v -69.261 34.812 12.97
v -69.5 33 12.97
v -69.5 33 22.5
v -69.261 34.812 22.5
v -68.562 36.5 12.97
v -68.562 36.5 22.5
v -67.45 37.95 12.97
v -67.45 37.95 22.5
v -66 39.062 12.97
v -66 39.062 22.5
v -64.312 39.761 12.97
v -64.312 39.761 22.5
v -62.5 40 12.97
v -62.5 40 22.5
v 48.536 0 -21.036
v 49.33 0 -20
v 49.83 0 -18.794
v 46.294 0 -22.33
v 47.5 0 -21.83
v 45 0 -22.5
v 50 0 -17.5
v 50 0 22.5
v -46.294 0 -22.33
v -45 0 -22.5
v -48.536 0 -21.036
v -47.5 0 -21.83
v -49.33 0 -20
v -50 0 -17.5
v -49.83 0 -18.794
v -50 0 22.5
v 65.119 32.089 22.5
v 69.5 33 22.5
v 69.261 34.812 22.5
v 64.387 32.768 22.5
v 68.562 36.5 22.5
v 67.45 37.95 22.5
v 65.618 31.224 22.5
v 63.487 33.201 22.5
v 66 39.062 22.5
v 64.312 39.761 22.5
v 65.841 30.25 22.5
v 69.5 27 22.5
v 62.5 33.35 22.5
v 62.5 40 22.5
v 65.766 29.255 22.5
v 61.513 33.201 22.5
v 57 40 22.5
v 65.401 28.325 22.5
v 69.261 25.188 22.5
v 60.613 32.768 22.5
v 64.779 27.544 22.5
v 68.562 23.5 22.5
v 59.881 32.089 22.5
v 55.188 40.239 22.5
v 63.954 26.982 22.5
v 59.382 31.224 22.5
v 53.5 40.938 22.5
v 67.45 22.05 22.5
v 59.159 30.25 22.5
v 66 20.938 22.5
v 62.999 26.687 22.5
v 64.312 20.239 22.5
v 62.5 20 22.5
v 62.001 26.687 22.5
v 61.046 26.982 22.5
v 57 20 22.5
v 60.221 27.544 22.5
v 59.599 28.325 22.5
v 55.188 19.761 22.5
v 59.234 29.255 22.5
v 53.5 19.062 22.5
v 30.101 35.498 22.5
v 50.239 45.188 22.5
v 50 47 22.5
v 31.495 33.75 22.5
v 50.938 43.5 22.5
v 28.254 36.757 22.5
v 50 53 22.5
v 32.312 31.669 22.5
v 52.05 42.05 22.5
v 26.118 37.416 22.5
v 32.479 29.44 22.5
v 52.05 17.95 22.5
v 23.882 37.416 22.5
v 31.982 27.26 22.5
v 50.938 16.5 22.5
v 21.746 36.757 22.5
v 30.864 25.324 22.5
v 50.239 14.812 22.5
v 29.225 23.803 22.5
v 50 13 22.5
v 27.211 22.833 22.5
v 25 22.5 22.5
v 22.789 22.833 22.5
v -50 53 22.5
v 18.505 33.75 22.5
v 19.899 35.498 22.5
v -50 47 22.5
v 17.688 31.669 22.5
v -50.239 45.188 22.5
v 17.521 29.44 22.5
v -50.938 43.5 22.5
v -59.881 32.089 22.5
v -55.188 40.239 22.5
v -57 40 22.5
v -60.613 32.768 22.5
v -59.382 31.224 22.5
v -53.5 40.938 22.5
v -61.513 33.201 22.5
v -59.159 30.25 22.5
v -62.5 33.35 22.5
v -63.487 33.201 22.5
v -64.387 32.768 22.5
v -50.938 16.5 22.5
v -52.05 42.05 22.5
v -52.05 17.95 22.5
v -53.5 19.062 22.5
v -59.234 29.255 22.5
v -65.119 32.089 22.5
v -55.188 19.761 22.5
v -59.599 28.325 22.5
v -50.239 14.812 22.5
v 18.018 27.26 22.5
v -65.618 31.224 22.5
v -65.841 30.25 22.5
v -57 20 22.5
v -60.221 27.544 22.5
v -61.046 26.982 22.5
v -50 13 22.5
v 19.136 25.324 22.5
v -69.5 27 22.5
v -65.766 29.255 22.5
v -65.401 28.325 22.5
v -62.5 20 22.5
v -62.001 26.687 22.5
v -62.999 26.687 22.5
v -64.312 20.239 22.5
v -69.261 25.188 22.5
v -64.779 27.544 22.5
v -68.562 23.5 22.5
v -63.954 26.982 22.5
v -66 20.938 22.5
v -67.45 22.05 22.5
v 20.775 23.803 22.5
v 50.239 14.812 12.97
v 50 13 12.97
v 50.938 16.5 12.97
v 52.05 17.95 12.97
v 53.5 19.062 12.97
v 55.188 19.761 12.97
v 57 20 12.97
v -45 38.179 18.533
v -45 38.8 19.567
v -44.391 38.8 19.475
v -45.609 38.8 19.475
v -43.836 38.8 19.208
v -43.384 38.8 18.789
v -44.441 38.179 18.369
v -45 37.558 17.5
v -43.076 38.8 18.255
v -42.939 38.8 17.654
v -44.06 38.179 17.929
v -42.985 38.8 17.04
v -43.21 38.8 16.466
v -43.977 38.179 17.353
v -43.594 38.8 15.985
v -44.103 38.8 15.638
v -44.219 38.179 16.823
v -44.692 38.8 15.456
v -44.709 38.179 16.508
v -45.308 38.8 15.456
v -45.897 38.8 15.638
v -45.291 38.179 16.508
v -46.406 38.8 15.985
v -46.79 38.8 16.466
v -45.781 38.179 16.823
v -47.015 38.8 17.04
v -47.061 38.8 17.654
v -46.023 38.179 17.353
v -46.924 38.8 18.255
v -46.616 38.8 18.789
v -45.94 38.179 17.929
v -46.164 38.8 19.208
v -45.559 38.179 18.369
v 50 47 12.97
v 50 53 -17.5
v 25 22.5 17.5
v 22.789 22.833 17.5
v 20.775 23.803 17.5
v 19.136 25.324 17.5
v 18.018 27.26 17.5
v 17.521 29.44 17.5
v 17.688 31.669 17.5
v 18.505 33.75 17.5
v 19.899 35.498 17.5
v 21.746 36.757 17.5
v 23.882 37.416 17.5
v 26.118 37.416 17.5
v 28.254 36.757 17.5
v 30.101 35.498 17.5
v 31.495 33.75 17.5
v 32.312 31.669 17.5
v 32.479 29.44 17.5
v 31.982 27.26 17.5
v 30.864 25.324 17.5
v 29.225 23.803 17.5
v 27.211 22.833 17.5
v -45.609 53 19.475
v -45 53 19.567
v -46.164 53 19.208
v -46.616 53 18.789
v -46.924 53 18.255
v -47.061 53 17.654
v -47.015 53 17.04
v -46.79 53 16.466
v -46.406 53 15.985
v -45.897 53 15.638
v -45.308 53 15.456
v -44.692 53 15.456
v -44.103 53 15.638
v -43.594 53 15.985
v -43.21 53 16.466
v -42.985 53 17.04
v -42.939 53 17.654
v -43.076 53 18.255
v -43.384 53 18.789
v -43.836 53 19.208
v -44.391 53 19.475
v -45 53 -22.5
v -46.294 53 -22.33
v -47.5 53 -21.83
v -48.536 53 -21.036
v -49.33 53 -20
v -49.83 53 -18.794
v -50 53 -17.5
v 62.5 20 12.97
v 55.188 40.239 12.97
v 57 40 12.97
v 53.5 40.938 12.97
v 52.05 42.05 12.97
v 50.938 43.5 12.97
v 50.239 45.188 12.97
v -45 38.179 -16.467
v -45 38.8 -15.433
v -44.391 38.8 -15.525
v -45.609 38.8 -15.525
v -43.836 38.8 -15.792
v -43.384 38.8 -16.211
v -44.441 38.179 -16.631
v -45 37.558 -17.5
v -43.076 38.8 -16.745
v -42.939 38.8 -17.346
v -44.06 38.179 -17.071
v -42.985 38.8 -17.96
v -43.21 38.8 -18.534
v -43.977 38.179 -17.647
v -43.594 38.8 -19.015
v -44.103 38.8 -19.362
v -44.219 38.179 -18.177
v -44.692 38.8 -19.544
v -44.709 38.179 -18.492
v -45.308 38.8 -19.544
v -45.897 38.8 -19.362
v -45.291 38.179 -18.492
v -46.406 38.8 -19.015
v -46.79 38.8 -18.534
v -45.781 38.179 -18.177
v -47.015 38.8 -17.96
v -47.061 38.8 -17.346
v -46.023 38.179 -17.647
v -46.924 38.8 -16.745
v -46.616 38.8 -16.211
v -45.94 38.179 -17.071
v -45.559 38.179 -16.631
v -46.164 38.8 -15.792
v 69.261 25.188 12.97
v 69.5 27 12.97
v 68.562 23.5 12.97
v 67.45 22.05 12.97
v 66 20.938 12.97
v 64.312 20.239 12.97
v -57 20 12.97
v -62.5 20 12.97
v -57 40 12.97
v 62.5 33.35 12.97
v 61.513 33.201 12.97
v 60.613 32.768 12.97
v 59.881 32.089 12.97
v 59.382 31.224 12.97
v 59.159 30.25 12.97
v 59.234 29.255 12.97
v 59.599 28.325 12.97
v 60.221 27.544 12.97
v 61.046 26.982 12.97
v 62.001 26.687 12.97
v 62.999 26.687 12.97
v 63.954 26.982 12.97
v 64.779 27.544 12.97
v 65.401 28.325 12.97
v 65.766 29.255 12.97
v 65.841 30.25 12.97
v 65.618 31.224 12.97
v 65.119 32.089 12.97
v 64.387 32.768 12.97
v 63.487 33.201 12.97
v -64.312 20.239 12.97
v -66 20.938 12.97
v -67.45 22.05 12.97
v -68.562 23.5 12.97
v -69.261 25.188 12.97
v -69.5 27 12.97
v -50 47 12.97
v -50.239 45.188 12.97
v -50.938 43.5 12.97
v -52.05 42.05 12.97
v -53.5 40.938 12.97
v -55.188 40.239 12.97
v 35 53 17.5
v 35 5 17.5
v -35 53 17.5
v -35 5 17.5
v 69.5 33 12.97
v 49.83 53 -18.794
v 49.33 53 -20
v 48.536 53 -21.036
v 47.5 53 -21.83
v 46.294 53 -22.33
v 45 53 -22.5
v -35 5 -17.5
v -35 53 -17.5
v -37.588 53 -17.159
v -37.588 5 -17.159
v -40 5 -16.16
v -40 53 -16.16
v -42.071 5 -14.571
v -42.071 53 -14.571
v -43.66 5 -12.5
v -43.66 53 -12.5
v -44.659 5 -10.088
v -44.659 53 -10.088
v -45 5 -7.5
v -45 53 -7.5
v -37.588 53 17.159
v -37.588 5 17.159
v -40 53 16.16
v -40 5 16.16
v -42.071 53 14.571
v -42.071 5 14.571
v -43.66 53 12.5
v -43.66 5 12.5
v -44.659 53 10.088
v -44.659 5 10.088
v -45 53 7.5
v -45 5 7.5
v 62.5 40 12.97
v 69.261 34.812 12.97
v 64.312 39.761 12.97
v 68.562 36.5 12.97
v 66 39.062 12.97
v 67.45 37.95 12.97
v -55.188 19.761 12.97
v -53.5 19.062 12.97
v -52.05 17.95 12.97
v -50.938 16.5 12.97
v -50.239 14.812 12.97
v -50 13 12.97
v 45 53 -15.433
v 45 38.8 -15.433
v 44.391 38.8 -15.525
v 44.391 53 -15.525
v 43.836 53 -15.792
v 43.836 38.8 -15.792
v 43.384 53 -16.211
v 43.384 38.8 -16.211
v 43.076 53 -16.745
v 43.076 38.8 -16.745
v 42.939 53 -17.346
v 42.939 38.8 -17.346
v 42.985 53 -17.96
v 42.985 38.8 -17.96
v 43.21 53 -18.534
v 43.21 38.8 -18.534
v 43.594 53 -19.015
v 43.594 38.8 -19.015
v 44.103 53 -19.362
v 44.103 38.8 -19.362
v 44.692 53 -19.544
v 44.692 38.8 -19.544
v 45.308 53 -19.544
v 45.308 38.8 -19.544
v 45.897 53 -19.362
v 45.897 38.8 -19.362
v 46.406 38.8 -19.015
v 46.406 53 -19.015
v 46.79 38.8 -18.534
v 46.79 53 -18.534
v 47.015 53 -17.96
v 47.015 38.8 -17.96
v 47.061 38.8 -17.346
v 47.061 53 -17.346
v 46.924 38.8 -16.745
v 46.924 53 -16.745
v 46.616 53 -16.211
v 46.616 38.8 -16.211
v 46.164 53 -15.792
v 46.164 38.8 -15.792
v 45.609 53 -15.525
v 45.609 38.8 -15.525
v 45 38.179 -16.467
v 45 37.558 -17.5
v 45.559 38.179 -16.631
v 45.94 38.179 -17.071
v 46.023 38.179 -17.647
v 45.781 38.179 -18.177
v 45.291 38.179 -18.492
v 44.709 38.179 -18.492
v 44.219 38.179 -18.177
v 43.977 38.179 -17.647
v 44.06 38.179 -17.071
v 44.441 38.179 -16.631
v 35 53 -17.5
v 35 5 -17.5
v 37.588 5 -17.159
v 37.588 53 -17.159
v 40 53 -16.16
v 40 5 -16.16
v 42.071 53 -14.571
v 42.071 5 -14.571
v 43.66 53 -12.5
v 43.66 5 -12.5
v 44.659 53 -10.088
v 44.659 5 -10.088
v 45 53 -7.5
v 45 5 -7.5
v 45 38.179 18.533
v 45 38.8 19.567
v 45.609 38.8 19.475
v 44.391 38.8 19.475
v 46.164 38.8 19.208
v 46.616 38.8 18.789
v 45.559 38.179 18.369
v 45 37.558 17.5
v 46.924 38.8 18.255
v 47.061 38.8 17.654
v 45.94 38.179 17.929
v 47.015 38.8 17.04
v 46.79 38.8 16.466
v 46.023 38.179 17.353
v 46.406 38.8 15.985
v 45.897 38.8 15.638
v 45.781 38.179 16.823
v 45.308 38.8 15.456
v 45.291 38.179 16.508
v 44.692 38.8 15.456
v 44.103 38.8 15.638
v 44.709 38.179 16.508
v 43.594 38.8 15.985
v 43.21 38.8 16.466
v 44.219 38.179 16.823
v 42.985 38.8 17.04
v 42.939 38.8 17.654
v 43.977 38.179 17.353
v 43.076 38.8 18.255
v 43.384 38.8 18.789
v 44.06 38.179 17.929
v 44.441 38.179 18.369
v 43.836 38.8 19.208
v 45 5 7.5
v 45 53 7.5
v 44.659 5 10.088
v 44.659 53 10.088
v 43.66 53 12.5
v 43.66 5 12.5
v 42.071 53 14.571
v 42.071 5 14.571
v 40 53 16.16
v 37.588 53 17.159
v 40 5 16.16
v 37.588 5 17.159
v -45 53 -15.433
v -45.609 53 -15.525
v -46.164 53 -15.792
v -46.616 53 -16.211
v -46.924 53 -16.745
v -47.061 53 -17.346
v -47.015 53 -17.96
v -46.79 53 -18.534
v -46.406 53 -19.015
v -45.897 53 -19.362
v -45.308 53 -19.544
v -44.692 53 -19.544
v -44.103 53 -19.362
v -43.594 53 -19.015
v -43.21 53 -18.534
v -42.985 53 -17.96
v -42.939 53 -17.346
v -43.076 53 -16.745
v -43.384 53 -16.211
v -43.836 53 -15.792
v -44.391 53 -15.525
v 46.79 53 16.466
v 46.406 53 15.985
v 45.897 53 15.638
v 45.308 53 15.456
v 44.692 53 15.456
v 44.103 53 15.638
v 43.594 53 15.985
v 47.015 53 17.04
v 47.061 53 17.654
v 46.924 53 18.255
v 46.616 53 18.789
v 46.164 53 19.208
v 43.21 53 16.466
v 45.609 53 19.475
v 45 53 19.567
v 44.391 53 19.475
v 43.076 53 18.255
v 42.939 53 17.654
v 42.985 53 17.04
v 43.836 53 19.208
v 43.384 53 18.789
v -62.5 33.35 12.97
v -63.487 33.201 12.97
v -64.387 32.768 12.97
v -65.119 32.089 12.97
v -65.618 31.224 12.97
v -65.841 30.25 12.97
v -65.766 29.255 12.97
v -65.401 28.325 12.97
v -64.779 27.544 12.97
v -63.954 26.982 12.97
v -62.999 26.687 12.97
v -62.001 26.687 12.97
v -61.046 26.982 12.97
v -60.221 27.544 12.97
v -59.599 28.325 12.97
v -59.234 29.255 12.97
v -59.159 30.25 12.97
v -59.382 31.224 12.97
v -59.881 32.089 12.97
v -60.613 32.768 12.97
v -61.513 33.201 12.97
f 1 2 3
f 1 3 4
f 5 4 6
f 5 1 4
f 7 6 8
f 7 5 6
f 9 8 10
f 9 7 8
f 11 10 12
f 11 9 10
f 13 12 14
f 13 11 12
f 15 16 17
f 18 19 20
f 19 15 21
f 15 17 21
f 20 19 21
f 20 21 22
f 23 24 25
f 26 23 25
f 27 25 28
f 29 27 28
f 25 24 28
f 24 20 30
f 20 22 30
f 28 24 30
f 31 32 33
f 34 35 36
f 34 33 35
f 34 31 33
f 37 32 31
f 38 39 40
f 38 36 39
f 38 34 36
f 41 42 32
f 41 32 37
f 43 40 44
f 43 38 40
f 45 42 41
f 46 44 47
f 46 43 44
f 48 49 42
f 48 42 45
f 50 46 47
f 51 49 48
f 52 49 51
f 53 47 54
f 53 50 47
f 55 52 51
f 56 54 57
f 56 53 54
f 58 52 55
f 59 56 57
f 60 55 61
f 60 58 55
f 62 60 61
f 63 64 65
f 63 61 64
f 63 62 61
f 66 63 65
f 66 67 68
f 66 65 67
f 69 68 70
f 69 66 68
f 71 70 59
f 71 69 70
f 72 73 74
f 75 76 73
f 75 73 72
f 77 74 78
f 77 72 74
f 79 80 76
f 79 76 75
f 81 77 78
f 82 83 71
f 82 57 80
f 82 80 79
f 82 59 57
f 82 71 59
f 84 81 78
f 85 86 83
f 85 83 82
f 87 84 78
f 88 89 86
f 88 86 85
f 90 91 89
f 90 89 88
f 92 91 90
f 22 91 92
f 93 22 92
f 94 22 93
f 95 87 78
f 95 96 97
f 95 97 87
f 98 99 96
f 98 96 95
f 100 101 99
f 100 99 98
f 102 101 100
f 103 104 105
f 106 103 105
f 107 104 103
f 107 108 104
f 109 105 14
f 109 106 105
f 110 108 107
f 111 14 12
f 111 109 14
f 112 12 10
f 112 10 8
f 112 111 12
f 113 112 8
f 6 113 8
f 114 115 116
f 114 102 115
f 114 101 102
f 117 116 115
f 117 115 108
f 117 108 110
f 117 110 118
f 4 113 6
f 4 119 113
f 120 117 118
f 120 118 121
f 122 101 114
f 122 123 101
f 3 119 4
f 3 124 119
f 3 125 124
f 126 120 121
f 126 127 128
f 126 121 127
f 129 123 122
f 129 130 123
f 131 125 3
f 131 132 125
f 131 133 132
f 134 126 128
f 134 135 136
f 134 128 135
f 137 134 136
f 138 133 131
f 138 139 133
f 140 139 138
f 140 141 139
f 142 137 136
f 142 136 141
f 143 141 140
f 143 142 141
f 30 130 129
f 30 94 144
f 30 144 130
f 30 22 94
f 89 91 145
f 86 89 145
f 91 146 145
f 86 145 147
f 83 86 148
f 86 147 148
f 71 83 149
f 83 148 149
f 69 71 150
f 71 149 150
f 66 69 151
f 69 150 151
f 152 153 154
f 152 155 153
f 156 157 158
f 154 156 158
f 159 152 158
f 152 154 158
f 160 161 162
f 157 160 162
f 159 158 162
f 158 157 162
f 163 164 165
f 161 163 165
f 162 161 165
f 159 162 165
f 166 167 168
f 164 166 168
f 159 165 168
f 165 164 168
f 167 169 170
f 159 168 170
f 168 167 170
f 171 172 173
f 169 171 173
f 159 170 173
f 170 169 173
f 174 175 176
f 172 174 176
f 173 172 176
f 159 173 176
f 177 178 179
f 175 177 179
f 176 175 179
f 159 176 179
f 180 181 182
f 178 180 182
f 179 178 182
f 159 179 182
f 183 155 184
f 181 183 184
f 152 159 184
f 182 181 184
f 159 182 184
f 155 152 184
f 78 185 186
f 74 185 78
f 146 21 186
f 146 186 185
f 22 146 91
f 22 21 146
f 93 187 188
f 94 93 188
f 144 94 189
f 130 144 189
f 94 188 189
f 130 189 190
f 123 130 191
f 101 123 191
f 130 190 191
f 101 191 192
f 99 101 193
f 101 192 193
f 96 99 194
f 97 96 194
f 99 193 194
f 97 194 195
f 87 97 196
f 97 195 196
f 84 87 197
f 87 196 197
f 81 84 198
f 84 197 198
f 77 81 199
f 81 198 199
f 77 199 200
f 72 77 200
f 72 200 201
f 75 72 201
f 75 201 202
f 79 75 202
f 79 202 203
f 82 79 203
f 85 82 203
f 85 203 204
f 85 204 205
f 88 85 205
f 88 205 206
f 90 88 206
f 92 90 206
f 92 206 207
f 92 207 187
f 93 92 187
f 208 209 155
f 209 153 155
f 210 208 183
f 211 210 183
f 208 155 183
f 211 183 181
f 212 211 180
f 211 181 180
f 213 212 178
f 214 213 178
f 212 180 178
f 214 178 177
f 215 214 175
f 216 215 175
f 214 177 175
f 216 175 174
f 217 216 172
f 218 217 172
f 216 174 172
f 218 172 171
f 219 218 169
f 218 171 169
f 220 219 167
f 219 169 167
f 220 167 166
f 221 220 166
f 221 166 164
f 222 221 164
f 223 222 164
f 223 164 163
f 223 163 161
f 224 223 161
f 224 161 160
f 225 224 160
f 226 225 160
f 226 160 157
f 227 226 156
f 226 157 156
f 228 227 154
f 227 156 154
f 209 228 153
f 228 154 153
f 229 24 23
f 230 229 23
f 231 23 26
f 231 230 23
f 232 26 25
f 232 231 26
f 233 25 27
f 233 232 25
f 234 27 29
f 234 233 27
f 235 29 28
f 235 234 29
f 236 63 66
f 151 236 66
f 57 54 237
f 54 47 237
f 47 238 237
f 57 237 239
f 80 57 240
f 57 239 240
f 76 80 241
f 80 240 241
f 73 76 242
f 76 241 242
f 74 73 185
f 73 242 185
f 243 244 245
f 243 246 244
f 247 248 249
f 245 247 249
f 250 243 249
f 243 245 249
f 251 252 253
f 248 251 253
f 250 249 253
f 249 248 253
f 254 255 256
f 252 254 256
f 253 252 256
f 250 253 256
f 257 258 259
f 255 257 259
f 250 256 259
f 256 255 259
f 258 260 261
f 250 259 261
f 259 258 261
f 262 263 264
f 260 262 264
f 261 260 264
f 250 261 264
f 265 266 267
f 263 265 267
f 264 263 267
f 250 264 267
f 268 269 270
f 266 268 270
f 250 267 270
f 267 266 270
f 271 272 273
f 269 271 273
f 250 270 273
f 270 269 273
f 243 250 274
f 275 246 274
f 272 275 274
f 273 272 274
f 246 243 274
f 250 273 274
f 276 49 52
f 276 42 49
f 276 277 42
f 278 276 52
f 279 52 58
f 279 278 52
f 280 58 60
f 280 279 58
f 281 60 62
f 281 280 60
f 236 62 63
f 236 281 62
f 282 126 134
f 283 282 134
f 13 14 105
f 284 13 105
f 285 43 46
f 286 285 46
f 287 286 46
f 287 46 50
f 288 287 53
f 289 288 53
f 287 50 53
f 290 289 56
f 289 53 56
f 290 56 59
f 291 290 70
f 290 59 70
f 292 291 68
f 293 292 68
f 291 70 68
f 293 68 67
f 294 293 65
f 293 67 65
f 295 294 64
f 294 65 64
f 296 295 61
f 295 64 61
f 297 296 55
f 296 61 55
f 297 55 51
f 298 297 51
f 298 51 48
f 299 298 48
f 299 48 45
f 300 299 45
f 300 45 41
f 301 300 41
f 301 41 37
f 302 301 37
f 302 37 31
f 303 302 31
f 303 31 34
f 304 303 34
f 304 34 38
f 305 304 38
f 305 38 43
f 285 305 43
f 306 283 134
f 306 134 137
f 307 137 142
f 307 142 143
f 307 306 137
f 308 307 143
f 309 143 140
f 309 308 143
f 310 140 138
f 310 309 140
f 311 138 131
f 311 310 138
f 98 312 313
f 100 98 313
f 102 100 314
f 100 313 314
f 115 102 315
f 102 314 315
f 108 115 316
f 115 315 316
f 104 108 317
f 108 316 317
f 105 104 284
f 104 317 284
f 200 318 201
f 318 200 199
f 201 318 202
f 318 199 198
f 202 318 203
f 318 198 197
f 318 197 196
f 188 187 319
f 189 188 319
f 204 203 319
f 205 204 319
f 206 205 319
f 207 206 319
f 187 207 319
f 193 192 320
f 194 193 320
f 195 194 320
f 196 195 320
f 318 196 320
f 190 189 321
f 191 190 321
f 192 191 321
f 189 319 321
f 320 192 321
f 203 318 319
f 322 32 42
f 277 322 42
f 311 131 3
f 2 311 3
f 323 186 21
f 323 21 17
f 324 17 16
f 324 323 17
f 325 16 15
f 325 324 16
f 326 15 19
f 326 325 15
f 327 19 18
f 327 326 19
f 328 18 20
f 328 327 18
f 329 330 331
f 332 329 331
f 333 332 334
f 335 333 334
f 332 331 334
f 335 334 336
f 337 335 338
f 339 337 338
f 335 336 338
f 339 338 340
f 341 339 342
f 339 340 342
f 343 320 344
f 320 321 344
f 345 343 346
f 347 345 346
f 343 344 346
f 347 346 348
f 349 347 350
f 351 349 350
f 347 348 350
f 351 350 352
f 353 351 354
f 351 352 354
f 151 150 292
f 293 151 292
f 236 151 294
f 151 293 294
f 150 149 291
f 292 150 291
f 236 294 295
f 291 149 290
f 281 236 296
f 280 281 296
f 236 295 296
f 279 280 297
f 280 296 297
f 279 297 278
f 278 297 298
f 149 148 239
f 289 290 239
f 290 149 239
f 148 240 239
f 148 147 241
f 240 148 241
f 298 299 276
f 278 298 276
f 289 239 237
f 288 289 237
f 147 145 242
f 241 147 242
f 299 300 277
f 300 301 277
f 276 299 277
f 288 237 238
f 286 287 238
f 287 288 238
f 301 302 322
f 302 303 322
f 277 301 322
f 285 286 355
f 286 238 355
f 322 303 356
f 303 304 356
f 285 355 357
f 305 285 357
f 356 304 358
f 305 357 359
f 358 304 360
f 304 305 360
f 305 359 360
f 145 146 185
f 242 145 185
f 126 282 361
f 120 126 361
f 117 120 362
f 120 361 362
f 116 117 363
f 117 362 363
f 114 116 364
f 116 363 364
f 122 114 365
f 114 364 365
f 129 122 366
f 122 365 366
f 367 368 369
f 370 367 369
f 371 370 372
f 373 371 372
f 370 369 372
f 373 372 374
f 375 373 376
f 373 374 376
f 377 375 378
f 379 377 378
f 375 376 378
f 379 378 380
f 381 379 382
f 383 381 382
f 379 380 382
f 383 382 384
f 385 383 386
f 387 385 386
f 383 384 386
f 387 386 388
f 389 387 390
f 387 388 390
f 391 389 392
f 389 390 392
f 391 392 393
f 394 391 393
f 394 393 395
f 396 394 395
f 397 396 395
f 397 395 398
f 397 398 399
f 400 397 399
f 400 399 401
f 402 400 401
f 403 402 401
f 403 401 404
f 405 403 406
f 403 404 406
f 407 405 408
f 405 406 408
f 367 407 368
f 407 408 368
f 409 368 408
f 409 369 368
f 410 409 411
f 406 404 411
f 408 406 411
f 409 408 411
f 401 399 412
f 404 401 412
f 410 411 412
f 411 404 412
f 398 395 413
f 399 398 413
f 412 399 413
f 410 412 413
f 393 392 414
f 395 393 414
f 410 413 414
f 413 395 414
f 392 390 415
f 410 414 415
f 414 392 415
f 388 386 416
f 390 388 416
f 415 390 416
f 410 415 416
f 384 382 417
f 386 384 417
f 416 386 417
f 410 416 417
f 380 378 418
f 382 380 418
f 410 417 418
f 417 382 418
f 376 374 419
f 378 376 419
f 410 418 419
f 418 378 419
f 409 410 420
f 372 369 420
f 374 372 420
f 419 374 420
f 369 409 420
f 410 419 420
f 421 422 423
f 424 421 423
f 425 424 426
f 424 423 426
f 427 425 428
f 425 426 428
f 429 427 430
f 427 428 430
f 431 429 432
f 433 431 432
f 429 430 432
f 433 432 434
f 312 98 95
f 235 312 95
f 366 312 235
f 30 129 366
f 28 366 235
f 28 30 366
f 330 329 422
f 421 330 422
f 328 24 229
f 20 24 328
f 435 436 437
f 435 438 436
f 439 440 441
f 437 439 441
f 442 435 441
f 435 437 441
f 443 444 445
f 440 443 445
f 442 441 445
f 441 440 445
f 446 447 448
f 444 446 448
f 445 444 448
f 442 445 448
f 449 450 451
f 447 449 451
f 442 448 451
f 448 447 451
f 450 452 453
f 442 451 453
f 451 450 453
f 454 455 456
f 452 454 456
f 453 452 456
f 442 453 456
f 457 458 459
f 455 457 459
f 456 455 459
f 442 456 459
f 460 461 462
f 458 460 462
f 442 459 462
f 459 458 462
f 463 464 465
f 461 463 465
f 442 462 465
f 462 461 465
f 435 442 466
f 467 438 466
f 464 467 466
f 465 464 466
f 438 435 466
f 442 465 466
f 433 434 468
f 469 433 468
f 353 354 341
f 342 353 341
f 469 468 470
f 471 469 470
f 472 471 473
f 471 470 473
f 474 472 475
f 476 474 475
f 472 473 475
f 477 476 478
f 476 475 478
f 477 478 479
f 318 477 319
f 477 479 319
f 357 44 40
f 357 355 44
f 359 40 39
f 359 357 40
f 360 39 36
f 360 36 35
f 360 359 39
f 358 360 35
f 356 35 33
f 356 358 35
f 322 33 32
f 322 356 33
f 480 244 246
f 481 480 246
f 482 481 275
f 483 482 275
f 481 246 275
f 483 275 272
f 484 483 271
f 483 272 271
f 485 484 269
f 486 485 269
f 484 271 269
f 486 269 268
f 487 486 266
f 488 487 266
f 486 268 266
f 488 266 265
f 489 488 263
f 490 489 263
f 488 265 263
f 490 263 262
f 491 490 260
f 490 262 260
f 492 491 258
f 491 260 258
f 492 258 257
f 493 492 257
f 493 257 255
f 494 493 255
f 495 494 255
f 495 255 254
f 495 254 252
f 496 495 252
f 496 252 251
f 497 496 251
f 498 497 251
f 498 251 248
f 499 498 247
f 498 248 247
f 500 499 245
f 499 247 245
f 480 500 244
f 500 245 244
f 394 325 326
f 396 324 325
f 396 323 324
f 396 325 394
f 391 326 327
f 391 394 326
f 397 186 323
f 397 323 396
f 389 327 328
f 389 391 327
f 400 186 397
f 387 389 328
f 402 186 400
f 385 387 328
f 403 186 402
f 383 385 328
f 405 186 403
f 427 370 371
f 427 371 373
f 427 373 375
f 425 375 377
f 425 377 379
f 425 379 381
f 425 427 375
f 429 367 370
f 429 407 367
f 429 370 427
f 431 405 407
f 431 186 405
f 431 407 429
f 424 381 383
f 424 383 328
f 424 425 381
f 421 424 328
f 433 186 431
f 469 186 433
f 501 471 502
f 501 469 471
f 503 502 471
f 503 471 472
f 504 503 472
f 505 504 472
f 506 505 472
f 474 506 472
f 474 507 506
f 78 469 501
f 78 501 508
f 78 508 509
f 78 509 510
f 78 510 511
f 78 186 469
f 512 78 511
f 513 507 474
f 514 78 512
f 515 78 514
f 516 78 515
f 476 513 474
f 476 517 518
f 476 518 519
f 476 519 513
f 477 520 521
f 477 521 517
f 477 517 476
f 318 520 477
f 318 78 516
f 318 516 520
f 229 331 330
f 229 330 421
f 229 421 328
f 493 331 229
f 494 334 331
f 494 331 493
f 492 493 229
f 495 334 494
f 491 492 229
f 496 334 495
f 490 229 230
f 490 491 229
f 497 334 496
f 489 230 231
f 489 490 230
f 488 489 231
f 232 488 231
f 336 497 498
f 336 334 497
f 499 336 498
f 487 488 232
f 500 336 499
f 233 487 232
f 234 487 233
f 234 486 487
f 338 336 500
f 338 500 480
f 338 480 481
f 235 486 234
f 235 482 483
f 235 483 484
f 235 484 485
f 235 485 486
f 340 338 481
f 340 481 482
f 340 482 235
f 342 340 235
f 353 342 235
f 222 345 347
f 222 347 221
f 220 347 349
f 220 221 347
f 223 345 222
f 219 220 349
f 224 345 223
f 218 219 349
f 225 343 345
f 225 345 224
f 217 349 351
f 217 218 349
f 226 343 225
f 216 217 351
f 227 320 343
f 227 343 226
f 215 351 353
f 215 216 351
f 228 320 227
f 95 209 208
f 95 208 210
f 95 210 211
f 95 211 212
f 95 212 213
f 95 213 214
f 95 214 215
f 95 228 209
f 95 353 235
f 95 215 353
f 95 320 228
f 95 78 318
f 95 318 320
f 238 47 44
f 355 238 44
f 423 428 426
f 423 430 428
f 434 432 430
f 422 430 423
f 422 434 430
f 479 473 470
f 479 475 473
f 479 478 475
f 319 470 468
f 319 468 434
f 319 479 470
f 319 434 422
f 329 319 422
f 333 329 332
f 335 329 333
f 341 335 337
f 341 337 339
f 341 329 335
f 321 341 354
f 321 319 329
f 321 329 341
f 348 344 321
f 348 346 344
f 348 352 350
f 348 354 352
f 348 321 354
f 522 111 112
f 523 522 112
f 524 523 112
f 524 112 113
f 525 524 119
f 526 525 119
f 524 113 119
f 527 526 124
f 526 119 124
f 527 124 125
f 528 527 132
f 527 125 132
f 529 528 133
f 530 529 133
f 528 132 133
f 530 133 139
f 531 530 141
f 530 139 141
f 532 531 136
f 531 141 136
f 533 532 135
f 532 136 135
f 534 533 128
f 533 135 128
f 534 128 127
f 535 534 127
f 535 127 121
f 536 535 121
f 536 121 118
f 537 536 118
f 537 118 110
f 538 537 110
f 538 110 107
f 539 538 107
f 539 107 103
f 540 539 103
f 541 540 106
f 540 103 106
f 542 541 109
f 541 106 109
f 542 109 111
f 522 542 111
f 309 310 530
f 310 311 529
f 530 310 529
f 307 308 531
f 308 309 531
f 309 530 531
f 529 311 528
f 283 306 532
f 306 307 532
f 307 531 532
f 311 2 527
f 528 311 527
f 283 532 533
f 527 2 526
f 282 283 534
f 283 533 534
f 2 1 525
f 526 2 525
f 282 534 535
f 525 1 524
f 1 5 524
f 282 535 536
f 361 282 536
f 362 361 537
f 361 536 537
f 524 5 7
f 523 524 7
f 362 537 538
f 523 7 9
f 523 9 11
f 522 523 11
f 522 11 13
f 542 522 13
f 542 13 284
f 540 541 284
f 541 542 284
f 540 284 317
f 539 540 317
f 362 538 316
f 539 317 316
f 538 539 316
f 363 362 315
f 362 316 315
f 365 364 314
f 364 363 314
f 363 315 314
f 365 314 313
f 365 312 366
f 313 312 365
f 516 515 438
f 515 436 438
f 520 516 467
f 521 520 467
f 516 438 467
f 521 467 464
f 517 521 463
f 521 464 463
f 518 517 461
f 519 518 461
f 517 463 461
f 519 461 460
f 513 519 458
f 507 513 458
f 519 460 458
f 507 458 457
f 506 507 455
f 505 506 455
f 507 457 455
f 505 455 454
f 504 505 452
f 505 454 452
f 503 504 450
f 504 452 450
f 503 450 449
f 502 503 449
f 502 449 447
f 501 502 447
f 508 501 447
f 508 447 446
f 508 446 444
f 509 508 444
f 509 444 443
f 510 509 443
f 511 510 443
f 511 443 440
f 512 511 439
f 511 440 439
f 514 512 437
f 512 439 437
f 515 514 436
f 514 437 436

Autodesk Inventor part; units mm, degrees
ref_plane "YZ Plane" through (0, 0, 0) normal (1, 0, 0) x (0, 1, 0)
ref_plane "XZ Plane" through (0, 0, 0) normal (0, 1, 0) x (-1, 0, 0)
ref_plane "XY Plane" through (0, 0, 0) normal (0, 0, 1) x (1, 0, 0)
sketch "Body Outline" plane through (0, 0, 0) normal (0, 1, 0) x (-1, 0, 0)
  line L0 (50, -22.5) -> (-50, -22.5)
  line L1 (-50, -22.5) -> (-50, 22.5)
  line L2 (-50, 22.5) -> (50, 22.5)
  line L3 (50, 22.5) -> (50, -22.5)
  point P0 (0, 0)
  dimension "d0" = 45
  dimension "d1" = 22.5
  dimension "d2" = 100
  dimension "d3" = 50
extrude "Body" add sketch "Body Outline" along normal blind 53
shell "Shell" thickness 5 removed faces 1 at (-16.6667, 53, 7.5)
fillet "Shell Fillet" radius 10 4 edges at (-45, 29, -17.5) (45, 29, -17.5) (45, 29, 17.5) (-45, 29, 17.5)
fillet "Shell Fillet" radius 5 2 edges at (-50, 26.5, -22.5) (50, 26.5, -22.5)
sketch "Lid Fastening Hole Pattern" plane through (0, 53, 0) normal (0, 1, 0) x (1, 0, 0)
  line L0 (45, 22.5) -> (-45, 22.5) projected
  line L1 (-50, 17.5) -> (-50, -22.5) projected
  point P0 (0, 0)
  point P1 (-45, 17.5)
  point P2 (45, 17.5)
  point P3 (-45, -17.5)
  point P4 (45, -17.5)
  dimension "d115" = 5
  dimension "d116" = 5
  dimension "d119" = 90
  dimension "d122" = 35
hole "Lid Fastening Holes" at (-45, 53, -17.5) at (45, 53, -17.5) at (-45, 53, 17.5) at (45, 53, 17.5) direction (0, -1, 0) diameter 4.134 depth 14.2 tip angle 118 thread size "M5x0.8" class "6H" standard "ISO Metric profile"
sketch "Cable Exit Hole Position" plane through (-50, 0, 22.5) normal (0, 0, 1) x (1, 0, 0)
  line L0 (100, 0) -> (0, 0) projected
  line L1 (100, 0) -> (100, 53) projected
  point P0 (50, 0)
  point P1 (75, 30)
  dimension "d167" = 30
  dimension "d168" = 25
hole "Cable Exit Hole" at (25, 30, 22.5) direction (0, 0, -1) diameter 15 depth 5
sketch "Flanges Outline" plane through (-50, 0, 22.5) normal (0, 0, 1) x (1, 0, 0)
  line L0 (-19.5, 40) -> (0, 40)
  line L1 (0, 40) -> (0, 20)
  line L2 (0, 20) -> (-19.5, 20)
  line L3 (-19.5, 20) -> (-19.5, 40)
  line L4 (100, 40) -> (119.5, 40)
  line L5 (119.5, 40) -> (119.5, 20)
  line L6 (119.5, 20) -> (100, 20)
  line L7 (100, 20) -> (100, 40)
  line L8 (0, 0) -> (0, 53) projected
  line L9 (100, 0) -> (100, 53) projected
  line L10 (100, 0) -> (0, 0) projected
  line L11 (0, 53) -> (100, 53) projected
  point P0 (50, 0)
  dimension "d176" = 0
  dimension "d177" = 0
  dimension "d178" = 19.5
  dimension "d179" = 19.5
  dimension "d180" = 20
  dimension "d181" = 20
  dimension "d182" = 13
  dimension "d183" = 13
extrude "Flanges" add sketch "Flanges Outline" against normal blind 9.53 contours L0 L1 L2 L3 | L4 L5 L6 L7
fillet "Flanges Fillet" radius 7 8 edges at (-50, 40, 17.735) (-69.5, 40, 17.735) (-69.5, 20, 17.735) (-50, 20, 17.735) (50, 40, 17.735) (69.5, 40, 17.735) (69.5, 20, 17.735) (50, 20, 17.735)
sketch "Box Fastening Hole Pattern" plane through (-50, 0, 12.97) normal (0, 0, -1) x (-1, 0, 0)
  line L0 (0, 0) -> (0, 53) projected
  line L1 (-5, 0) -> (-95, 0) projected
  point P0 (-50, 0)
  point P1 (12.5, 30)
  point P2 (-112.5, 30)
  dimension "d187" = 12.5
  dimension "d188" = 30
  dimension "d191" = 125
hole "Box Fastening Holes" at (-62.5, 30, 12.97) at (62.5, 30, 12.97) direction (0, 0, 1) diameter 6.7 end through all
equation "\"d1\" = 0.5 * d0"
equation "\"d3\" = 0.5 * d2"
equation "\"d116\" = d115"
equation "\"d179\" = d178"
equation "\"d181\" = d180"
properties part number "Connector Box" material "Aluminum 6061"
